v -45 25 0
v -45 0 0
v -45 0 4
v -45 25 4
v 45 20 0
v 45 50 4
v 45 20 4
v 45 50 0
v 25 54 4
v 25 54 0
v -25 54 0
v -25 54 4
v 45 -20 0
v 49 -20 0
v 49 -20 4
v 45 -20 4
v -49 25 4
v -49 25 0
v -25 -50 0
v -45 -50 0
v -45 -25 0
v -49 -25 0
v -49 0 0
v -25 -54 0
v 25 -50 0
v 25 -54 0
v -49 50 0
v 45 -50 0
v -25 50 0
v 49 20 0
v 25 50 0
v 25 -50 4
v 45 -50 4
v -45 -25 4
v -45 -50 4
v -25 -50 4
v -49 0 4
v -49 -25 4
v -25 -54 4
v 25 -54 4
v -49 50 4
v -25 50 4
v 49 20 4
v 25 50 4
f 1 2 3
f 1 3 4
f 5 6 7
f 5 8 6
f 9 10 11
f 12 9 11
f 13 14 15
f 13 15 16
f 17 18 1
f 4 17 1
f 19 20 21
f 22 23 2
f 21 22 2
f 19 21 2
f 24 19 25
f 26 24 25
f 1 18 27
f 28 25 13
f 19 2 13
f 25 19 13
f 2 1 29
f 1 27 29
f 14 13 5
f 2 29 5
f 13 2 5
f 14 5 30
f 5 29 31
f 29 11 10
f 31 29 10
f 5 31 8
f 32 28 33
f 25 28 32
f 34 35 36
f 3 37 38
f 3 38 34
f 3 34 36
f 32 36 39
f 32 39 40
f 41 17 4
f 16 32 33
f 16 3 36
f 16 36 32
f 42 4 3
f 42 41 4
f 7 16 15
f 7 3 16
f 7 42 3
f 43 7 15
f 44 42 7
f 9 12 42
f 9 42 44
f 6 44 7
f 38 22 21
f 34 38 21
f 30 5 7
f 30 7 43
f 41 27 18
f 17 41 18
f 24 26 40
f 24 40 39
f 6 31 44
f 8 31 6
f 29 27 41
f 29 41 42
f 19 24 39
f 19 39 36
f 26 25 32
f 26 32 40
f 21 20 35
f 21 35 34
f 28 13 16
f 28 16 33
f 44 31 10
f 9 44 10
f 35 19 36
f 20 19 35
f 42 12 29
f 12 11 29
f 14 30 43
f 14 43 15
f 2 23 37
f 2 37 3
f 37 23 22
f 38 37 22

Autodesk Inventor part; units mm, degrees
ref_plane "YZ Plane" through (0, 0, 0) normal (1, 0, 0) x (0, 1, 0)
ref_plane "XZ Plane" through (0, 0, 0) normal (0, 1, 0) x (-1, 0, 0)
ref_plane "XY Plane" through (0, 0, 0) normal (0, 0, 1) x (1, 0, 0)
sketch "Sketch1" plane through (0, 0, 0) normal (0, 0, 1) x (1, 0, 0)
  line L0 (45, -50) -> (25, -50)
  line L1 (-45, -50) -> (-45, 50)
  line L2 (-45, 50) -> (-25, 50)
  line L3 (45, 50) -> (45, -50)
  line L4 (45, -50) -> (-45, 50) construction
  line L5 (-45, -50) -> (45, 50) construction
  line L6 (-25, 50) -> (25, 50) construction
  line L7 (25, 50) -> (25, 54)
  line L8 (25, 54) -> (-25, 54)
  line L9 (-25, 54) -> (-25, 50)
  line L10 (-25, -50) -> (25, -50) construction
  line L11 (25, -50) -> (25, -54)
  line L12 (25, -54) -> (-25, -54)
  line L13 (-25, -54) -> (-25, -50)
  line L14 (-45, 50) -> (-49, 50)
  line L15 (-49, 50) -> (-49, 25)
  line L16 (-49, 25) -> (-45, 25)
  line L17 (-45, 25) -> (-45, 50)
  line L18 (-45, 0) -> (-45, 25)
  line L19 (-45, 25) -> (-49, 25)
  line L20 (-49, 25) -> (-49, 0)
  line L21 (-49, 0) -> (-45, 0)
  line L22 (-45, -25) -> (-45, 0) construction
  line L23 (-45, 0) -> (-49, 0)
  line L24 (-49, 0) -> (-49, -25)
  line L25 (-49, -25) -> (-45, -25)
  line L26 (-45, -50) -> (-45, -25)
  line L27 (-45, -25) -> (-49, -25)
  line L28 (-49, -25) -> (-49, -50)
  line L29 (-49, -50) -> (-45, -50)
  line L30 (0, -75.6) -> (0, 75.6) projected
  line L31 (45, 20) -> (49, 20)
  line L32 (49, 20) -> (49, -20)
  line L33 (49, -20) -> (45, -20)
  line L34 (45, -20) -> (45, 20)
  line L35 (25, 50) -> (45, 50)
  line L36 (-25, 50) -> (25, 50) construction
  line L37 (-25, -50) -> (-45, -50)
  line L38 (25, -50) -> (-25, -50)
  line L39 (-68.6, 0) -> (68.6, 0) projected
  point P0 (0, 0)
  dimension "d0" = 90
  dimension "d1" = 100
  dimension "d2" = 50
  dimension "d3" = 4
  dimension "d4" = 50
  dimension "d5" = 4
  dimension "d6" = 4
  dimension "d7" = 25
  dimension "d10" = 25
  dimension "d17" = 4
  dimension "d18" = 40
extrude "Extrusion1" add sketch "Sketch1" along normal blind 4 contours L0 L38 L30 L39 L3 | L11 L12 L30 L38 | L3 L39 L32 L33 | L38 L37 L1 L39 L30 | L30 L12 L13 L38 | L39 L30 L8 L7 L35 L3 | L3 L31 L32 L39 | L39 L1 L2 L9 L8 L30 | L1 L25 L24 L21 | L16 L15 L14 L1
properties part number "CarSide_V1" material "Wood (Oak)"
